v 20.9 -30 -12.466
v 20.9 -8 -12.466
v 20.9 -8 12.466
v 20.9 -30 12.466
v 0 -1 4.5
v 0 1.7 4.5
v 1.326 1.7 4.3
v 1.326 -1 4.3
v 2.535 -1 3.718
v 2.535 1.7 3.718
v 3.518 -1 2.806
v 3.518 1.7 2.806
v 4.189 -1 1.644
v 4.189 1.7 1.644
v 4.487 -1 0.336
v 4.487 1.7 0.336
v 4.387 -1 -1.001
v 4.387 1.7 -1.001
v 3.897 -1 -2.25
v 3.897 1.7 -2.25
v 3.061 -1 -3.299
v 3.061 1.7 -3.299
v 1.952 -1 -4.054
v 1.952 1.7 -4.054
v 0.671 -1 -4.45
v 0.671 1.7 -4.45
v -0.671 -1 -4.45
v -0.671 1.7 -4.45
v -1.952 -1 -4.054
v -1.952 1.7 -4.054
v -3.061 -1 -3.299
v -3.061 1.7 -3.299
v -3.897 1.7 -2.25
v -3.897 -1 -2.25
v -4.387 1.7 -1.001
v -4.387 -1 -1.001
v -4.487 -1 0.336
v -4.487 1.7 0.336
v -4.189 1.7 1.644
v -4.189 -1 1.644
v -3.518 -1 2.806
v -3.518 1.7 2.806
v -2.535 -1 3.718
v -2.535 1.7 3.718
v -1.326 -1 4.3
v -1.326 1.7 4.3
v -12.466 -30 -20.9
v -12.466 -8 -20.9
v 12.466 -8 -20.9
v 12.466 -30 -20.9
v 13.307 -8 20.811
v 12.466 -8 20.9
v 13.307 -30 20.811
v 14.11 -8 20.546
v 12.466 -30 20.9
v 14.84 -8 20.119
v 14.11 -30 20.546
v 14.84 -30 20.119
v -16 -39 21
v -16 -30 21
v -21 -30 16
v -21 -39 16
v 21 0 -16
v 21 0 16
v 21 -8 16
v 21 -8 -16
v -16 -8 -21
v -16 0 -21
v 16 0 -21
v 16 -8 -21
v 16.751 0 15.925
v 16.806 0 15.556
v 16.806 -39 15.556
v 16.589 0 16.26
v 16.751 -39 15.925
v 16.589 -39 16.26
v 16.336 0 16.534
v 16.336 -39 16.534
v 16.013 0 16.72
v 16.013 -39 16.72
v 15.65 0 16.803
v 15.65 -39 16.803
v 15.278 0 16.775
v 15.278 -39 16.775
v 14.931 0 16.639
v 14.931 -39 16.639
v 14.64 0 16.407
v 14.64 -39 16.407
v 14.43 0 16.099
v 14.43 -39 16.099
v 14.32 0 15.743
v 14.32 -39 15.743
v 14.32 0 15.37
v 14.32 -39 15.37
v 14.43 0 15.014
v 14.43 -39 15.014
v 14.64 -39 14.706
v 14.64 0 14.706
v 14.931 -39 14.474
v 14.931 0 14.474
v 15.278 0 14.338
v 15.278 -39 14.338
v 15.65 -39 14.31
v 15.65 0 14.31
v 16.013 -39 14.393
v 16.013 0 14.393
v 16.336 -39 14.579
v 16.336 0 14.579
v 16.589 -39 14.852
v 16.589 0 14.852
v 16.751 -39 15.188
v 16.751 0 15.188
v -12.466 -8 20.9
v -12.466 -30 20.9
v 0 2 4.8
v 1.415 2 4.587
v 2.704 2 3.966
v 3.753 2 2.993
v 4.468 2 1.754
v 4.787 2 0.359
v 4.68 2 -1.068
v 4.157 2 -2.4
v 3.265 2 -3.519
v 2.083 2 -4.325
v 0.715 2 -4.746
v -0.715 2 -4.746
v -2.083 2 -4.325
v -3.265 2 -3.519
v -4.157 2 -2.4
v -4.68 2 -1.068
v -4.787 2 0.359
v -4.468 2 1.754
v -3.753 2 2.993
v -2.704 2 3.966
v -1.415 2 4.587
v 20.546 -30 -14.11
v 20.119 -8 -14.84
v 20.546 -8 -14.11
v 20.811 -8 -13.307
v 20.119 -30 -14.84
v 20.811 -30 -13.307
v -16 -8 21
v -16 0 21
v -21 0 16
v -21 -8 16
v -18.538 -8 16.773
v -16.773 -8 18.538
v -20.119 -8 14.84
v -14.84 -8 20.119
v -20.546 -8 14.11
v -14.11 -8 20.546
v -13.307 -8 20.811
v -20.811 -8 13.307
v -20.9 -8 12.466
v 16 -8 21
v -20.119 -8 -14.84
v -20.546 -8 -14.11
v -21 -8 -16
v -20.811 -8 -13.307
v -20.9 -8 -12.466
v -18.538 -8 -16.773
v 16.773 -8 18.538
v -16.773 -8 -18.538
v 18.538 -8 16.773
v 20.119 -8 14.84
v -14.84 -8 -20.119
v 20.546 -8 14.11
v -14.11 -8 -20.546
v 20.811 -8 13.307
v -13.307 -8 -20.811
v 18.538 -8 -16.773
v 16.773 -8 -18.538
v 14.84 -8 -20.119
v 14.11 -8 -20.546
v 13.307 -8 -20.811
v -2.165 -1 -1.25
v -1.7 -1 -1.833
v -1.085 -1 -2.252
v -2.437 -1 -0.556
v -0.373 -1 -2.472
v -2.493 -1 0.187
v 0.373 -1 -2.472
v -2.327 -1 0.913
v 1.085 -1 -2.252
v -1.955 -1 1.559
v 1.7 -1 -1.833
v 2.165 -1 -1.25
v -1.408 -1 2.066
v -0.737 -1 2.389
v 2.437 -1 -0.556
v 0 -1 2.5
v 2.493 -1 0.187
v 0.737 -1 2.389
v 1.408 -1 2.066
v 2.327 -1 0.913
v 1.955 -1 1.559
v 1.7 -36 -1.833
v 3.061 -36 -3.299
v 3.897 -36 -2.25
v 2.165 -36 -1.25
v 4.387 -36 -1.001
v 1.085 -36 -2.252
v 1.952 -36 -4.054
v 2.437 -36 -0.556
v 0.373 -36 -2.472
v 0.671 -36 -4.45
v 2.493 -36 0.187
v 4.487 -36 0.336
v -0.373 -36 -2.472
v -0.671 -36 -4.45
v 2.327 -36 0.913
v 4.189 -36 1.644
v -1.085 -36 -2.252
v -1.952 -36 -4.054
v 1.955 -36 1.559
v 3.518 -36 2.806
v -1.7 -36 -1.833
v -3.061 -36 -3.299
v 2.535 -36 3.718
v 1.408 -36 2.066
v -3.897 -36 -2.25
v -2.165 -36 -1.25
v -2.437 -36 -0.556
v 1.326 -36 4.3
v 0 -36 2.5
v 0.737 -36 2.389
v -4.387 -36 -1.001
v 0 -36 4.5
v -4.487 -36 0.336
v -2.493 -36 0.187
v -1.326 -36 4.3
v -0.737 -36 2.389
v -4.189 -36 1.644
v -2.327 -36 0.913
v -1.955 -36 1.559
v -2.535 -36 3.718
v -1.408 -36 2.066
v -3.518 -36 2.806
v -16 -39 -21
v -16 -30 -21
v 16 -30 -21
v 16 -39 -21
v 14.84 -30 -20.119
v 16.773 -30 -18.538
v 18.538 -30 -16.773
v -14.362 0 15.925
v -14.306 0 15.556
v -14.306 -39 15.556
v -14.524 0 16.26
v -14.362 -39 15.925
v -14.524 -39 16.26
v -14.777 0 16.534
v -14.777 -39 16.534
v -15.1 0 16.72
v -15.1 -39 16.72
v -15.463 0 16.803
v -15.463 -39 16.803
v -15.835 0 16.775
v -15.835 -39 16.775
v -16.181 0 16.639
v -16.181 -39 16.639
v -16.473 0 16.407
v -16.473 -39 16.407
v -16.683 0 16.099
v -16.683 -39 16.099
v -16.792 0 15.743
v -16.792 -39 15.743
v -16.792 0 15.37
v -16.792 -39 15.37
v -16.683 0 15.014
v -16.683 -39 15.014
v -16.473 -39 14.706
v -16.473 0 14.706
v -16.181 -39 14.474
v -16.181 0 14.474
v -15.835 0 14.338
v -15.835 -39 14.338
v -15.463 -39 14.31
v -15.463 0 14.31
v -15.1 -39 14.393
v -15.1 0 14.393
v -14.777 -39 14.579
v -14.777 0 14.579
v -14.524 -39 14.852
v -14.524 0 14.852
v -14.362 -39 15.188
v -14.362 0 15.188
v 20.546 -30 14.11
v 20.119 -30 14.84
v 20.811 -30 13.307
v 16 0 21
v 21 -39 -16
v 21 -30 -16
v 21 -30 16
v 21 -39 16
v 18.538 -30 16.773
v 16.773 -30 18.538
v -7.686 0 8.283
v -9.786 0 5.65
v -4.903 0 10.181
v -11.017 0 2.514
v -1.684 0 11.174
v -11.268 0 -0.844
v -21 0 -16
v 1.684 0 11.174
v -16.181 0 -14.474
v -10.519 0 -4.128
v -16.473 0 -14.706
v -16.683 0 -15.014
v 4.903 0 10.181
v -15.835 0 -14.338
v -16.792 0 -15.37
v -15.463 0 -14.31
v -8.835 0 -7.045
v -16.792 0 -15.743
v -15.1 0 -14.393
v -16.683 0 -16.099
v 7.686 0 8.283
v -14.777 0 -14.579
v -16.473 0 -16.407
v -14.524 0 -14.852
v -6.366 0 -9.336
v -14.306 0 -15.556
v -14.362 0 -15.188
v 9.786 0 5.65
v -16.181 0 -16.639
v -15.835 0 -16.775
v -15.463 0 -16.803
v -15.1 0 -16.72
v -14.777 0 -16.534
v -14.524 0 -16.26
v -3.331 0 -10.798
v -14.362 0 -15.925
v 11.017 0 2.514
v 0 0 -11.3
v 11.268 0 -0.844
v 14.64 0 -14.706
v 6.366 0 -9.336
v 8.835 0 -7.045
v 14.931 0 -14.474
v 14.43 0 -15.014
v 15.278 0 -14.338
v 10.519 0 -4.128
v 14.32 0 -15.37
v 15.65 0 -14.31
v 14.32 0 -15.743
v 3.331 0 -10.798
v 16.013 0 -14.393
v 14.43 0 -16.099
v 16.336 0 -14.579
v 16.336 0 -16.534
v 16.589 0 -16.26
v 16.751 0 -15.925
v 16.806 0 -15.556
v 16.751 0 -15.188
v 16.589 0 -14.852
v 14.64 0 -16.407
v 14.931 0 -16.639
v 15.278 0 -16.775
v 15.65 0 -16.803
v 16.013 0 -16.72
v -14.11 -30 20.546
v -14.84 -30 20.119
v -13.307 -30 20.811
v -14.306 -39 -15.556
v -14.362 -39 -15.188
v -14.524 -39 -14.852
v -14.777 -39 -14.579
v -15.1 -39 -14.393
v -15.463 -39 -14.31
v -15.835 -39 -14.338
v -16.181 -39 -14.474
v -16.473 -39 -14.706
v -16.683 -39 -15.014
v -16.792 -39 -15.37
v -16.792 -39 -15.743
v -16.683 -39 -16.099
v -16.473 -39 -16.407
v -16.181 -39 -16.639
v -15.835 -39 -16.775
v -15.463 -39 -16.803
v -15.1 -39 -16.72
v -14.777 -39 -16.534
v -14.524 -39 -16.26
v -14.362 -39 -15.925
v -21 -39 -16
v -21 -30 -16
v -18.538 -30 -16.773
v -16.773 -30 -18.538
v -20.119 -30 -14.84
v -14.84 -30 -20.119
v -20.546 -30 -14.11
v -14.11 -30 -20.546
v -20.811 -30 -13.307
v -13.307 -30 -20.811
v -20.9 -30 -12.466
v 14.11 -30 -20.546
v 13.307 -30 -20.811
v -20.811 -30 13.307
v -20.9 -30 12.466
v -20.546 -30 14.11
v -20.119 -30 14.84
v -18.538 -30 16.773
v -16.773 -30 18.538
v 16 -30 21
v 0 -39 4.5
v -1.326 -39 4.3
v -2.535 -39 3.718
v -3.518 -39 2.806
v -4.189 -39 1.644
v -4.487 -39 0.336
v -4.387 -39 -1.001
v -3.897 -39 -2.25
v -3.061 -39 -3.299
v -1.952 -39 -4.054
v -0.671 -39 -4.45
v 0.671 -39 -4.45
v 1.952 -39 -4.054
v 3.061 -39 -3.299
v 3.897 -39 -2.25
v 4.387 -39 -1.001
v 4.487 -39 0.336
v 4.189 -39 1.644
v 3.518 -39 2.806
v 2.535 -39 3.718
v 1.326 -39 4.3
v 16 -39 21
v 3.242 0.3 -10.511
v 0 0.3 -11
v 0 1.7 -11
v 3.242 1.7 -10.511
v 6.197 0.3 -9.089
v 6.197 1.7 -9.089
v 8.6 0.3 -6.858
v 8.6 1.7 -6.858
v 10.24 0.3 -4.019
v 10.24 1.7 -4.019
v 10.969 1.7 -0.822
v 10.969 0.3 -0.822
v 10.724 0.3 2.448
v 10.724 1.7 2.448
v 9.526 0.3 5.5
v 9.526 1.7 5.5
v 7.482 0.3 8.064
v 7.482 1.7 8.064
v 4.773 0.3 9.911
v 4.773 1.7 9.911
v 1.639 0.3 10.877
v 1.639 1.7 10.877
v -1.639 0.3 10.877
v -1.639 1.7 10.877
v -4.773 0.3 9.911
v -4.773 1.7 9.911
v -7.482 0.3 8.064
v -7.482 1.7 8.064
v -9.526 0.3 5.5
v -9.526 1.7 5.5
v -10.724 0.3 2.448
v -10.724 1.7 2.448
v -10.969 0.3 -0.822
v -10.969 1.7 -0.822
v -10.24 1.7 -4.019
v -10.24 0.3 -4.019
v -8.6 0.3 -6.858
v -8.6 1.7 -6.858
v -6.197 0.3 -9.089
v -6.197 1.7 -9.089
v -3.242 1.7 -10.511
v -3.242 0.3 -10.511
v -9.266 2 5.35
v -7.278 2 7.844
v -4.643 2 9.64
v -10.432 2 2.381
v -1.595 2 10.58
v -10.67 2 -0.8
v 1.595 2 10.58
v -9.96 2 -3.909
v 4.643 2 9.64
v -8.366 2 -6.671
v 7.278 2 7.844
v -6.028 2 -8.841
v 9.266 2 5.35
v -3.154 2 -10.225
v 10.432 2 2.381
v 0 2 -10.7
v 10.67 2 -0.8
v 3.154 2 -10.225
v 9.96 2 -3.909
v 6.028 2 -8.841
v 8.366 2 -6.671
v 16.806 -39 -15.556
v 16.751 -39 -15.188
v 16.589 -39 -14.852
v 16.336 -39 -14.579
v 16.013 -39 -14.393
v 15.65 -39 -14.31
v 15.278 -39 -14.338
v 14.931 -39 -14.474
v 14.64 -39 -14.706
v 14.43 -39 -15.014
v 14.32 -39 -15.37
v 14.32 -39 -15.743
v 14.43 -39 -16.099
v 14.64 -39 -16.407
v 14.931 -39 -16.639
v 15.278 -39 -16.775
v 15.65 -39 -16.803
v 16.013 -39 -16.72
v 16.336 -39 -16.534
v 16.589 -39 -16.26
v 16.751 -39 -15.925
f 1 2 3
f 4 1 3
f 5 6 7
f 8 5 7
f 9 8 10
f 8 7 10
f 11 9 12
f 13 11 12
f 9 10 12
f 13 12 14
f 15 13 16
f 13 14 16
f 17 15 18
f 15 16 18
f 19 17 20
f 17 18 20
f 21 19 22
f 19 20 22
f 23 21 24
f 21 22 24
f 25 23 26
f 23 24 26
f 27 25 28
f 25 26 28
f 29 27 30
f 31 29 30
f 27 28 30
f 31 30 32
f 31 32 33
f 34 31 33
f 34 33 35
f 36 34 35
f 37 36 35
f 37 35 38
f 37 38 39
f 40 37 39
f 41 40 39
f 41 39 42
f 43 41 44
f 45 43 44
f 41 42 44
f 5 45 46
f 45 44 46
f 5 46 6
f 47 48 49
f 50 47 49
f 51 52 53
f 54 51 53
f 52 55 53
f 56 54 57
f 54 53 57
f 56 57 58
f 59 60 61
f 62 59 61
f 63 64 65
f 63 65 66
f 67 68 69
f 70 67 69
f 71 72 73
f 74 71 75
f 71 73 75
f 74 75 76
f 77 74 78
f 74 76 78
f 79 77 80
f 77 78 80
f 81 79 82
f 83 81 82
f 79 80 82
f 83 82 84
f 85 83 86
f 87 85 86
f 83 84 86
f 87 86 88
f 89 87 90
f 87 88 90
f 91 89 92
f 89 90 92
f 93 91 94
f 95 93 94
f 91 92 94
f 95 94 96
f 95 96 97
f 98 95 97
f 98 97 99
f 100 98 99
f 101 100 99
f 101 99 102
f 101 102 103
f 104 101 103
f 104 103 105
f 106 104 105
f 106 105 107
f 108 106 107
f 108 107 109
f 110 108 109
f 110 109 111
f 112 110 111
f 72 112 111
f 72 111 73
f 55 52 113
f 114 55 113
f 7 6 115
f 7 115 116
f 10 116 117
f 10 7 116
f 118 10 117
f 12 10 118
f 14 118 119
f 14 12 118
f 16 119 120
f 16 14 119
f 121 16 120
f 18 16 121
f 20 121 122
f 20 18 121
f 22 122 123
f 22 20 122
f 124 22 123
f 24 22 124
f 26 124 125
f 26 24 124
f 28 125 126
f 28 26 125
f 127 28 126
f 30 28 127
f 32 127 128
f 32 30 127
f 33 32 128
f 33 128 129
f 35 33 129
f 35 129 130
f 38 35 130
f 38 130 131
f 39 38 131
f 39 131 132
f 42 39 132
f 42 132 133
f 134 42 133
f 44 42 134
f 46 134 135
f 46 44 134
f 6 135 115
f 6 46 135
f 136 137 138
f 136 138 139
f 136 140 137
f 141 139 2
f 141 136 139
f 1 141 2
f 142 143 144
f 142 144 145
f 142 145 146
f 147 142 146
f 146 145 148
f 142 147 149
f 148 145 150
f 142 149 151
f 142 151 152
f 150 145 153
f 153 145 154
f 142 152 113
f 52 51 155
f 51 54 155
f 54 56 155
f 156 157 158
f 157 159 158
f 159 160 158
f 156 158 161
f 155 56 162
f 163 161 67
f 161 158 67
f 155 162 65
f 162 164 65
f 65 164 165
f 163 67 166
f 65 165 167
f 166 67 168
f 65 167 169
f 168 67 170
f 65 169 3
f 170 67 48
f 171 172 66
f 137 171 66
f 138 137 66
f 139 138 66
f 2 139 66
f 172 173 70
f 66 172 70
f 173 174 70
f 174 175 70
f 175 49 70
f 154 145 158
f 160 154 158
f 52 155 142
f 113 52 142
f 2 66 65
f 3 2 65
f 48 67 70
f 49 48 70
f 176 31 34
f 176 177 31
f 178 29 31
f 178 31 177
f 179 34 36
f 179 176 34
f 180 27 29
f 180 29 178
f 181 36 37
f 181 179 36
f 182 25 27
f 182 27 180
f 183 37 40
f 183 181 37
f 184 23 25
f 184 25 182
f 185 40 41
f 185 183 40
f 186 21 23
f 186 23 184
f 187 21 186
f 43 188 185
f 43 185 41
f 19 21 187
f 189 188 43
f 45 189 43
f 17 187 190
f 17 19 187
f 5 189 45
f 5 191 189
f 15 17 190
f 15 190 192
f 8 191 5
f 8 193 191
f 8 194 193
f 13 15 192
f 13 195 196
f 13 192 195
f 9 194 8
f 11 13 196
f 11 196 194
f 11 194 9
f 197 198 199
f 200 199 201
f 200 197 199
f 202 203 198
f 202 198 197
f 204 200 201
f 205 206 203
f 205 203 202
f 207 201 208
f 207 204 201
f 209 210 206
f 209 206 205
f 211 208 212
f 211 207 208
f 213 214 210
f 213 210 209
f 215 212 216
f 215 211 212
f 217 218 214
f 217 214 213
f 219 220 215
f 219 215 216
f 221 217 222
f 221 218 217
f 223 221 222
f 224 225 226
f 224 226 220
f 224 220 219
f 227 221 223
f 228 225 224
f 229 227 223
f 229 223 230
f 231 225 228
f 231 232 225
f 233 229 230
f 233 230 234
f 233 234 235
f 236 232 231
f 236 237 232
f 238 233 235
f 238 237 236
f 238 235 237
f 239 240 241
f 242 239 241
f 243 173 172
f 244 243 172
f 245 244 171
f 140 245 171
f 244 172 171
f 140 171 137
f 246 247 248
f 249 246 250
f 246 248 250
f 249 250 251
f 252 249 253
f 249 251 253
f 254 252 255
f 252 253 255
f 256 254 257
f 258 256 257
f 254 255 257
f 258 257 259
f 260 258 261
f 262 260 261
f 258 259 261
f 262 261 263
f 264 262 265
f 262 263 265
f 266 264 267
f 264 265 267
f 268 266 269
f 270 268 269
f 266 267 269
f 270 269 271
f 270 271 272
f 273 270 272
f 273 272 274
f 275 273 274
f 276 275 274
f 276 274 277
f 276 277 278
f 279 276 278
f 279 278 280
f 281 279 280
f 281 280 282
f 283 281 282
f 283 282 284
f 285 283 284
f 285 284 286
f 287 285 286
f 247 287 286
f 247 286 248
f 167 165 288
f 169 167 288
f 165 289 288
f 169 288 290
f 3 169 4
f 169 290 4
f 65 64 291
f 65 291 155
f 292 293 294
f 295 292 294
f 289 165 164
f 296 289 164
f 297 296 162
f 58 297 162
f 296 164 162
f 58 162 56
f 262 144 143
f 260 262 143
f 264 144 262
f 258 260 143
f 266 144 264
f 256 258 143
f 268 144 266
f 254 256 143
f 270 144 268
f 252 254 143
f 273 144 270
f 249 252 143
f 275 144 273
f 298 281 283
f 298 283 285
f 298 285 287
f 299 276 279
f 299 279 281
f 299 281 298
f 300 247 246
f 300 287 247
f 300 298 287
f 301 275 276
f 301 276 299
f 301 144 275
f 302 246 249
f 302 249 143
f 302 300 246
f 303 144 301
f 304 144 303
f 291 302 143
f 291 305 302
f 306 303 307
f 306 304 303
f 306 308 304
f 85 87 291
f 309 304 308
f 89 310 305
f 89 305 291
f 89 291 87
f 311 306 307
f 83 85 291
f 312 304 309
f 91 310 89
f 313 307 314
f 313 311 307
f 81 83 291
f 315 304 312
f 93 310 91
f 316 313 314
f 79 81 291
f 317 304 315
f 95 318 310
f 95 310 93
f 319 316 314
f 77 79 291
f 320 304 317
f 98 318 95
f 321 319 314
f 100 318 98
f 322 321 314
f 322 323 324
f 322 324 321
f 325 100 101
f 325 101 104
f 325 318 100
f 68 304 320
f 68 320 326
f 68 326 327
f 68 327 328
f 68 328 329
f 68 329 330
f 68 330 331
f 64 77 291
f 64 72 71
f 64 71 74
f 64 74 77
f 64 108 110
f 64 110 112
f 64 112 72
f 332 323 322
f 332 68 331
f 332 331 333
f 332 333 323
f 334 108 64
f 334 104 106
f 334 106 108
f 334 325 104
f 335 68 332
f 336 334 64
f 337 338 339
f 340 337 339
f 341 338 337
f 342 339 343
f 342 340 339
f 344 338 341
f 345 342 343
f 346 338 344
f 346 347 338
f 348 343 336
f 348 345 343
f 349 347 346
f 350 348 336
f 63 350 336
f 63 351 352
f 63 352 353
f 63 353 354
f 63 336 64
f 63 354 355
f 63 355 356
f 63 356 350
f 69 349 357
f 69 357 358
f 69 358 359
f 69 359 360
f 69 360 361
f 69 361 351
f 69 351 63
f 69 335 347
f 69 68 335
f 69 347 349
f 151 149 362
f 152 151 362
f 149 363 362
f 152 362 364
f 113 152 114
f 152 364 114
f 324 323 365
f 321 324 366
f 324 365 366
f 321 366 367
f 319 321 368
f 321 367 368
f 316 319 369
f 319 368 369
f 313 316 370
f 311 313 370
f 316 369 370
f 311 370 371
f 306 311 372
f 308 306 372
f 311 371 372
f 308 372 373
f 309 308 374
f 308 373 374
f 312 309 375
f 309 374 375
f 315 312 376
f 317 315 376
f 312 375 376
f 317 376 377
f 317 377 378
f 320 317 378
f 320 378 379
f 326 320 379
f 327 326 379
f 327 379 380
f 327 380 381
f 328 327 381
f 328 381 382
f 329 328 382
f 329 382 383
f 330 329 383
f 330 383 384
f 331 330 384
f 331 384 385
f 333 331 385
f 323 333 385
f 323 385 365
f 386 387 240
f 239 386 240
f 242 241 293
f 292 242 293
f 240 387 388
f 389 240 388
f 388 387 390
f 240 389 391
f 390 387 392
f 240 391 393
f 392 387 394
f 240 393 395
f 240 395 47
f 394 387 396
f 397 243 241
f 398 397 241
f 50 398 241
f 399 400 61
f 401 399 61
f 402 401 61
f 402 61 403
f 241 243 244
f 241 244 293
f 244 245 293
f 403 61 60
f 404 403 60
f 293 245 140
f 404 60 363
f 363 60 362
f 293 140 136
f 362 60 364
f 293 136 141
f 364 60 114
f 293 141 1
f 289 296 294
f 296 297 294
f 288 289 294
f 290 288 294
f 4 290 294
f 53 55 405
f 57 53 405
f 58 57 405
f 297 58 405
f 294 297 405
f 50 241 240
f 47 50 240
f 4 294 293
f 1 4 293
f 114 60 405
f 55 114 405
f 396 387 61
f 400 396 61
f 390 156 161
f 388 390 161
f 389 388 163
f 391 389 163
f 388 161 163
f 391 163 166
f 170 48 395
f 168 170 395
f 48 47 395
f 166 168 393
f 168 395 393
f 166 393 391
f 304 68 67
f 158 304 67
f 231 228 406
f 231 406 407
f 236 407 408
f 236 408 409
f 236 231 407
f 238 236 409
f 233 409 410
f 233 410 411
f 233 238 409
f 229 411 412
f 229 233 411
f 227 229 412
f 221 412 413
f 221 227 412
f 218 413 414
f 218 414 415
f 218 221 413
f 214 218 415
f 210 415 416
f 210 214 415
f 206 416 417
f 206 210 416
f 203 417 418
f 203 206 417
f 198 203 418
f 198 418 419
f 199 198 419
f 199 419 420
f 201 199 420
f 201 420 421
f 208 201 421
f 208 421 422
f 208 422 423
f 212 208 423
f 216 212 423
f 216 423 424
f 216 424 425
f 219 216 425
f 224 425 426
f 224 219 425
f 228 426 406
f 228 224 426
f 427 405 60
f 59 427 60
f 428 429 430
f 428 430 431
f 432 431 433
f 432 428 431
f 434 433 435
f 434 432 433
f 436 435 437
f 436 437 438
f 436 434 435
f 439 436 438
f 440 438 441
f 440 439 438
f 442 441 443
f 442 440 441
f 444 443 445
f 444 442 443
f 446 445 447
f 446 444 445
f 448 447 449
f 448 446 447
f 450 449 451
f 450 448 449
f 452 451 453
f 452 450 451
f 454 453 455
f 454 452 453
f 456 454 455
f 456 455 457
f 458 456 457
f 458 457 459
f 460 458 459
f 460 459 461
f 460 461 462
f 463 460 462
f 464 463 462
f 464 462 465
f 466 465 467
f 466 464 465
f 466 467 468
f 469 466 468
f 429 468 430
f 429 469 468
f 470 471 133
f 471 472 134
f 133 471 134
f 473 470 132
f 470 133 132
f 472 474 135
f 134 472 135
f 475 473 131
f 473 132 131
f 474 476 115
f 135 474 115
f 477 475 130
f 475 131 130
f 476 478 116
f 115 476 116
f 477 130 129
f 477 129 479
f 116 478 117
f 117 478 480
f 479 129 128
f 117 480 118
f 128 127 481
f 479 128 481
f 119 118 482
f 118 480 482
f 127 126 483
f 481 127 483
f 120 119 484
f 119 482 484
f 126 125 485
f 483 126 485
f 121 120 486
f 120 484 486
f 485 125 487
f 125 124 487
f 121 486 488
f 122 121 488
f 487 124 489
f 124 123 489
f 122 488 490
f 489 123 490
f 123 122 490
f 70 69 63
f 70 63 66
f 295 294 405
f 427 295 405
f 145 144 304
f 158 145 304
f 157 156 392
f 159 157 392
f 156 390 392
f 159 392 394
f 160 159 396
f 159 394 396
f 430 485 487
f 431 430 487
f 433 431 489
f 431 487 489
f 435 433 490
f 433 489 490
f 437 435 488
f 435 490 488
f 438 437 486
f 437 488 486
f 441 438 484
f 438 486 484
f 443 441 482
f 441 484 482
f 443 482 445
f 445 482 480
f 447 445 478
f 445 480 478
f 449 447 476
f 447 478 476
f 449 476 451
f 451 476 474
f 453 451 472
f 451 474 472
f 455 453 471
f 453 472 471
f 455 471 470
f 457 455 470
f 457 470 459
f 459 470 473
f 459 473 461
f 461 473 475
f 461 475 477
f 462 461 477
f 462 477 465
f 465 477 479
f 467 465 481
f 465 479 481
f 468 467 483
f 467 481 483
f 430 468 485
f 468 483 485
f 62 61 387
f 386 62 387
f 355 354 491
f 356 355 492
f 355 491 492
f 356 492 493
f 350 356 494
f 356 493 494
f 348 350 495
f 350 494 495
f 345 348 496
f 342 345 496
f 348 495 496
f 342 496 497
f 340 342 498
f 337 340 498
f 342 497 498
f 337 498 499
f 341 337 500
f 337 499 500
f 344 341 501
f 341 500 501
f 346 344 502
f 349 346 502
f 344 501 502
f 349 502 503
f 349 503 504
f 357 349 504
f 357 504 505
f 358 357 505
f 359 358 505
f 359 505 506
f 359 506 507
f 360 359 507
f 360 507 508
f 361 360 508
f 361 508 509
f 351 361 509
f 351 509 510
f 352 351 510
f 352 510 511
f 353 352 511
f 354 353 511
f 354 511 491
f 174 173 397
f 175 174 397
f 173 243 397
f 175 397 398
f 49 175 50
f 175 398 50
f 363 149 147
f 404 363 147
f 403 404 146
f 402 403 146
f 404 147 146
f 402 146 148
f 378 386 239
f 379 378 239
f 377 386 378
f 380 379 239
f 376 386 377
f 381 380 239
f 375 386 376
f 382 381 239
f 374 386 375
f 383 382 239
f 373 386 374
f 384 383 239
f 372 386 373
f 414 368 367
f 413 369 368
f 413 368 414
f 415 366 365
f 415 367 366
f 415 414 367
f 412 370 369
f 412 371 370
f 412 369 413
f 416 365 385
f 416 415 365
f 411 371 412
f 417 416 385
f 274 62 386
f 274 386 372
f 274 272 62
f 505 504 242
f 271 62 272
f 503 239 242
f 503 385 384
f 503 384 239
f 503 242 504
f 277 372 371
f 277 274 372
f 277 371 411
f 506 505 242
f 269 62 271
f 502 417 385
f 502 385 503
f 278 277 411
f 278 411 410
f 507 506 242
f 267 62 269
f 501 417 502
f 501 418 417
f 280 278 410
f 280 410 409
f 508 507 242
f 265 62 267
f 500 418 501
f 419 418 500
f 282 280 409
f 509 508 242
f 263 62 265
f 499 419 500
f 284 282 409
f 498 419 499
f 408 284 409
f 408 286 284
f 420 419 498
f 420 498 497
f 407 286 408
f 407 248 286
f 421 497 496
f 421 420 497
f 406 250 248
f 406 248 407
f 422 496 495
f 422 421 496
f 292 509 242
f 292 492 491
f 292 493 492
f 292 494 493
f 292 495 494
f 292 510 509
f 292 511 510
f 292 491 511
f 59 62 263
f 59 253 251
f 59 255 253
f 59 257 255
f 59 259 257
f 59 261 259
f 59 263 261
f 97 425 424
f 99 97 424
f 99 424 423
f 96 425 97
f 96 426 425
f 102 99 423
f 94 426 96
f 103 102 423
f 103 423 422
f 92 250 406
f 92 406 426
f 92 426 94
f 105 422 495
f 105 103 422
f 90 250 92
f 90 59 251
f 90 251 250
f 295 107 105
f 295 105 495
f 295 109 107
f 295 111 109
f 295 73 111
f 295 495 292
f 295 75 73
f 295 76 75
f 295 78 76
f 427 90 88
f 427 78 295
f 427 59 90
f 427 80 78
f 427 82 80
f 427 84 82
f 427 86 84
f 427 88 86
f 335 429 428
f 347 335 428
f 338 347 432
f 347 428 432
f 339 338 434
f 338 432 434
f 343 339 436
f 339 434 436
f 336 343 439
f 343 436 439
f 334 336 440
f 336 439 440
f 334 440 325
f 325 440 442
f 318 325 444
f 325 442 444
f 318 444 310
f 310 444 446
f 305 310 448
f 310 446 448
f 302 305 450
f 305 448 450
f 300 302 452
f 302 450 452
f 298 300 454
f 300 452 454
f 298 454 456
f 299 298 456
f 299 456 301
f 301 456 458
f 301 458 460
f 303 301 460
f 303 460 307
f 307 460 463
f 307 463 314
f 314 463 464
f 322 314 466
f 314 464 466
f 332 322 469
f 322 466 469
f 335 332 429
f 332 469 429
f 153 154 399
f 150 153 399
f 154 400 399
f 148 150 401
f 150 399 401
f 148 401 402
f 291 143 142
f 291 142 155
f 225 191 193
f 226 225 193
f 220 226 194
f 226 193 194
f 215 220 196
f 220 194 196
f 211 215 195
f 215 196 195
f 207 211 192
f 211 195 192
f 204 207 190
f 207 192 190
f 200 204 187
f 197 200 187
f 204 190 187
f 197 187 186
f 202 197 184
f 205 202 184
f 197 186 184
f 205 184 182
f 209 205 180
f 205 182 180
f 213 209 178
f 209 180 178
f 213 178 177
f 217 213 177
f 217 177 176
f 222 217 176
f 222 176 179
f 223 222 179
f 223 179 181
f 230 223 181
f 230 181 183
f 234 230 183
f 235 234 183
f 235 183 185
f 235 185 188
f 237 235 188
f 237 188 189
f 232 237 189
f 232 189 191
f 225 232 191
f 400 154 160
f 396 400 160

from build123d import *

# Parameters (mm, degrees)
ESQUISSE1_W             = 42
ESQUISSE1_H             = 42
BOSS_EXTRU_1_DEPTH      = 8
CHANFREIN1_SIZE         = 5
ESQUISSE2_R             = 11
BOSS_EXTRU_2_DEPTH      = 2
ESQUISSE5_R             = 4.5
ENL_V_MAT_EXTRU_1_DEPTH = 3
CHANFREIN2_SIZE         = 0.3
BOSS_EXTRU_3_DEPTH      = 22
CONG_1_R                = 4
BOSS_EXTRU_4_DEPTH      = 9
ENL_V_START             = -3
ESQUISSE8_R             = 4.5
ENL_V_MAT_EXTRU_2_DEPTH = 3
TROU_TARAUD_M31_D       = 2.5
ESQUISSE9_R             = 2.5
ENL_V_MAT_EXTRU_3_DEPTH = 49.228622207


with BuildPart() as part:
    # Esquisse1 → Boss.-Extru.1 (new body)
    with BuildSketch(Plane(origin=(0, 0, 0), x_dir=(1, 0, 0), z_dir=(0, 1, 0))):
        Rectangle(ESQUISSE1_W, ESQUISSE1_H)
    extrude(amount=-BOSS_EXTRU_1_DEPTH)

    # Chanfrein1
    chanfrein1_edges = [part.edges().sort_by_distance(p)[0] for p in [
        (-21, -4, -21),
        (21, -4, -21),
        (21, -4, 21),
        (-21, -4, 21),
    ]]
    chamfer(chanfrein1_edges, length=CHANFREIN1_SIZE)

    # Esquisse2 → Boss.-Extru.2 (add)
    with BuildSketch(Plane(origin=(0, 0, 0), x_dir=(-1, 0, 0), z_dir=(0, -1, 0))):
        with Locations(Location((0, 0, 0), (0, 0, 90))):
            Circle(ESQUISSE2_R)
    extrude(amount=-BOSS_EXTRU_2_DEPTH)

    # Esquisse5 → Enlèv. mat.-Extru.1 (cut)
    with BuildSketch(Plane(origin=(0, 2, 0), x_dir=(1, 0, 0), z_dir=(0, 1, 0))):
        with Locations(Location((0, 0, 0), (0, 0, 270))):
            Circle(ESQUISSE5_R)
    extrude(amount=-ENL_V_MAT_EXTRU_1_DEPTH, mode=Mode.SUBTRACT)

    # Chanfrein2
    chanfrein2_edges = [part.edges().sort_by_distance(p)[0] for p in [
        (0, 0, 11),
        (0, 2, 11),
        (0, 2, -4.5),
    ]]
    chamfer(chanfrein2_edges, length=CHANFREIN2_SIZE)

    # Esquisse6 → Boss.-Extru.3 (add)
    with BuildSketch(Plane.XZ.offset(8)):
        with BuildLine():
            Line((20.9, -13.718236038), (20.9, 13.718236038))
            ThreePointArc((20.9, 13.718236038), (17.67766953, 17.67766953), (13.718236038, 20.9))
            Line((13.718236038, 20.9), (-13.718236038, 20.9))
            ThreePointArc((-13.718236038, 20.9), (-17.67766953, 17.67766953), (-20.9, 13.718236038))
            Line((-20.9, 13.718236038), (-20.9, -13.718236038))
            ThreePointArc((-20.9, -13.718236038), (-17.67766953, -17.67766953), (-13.718236038, -20.9))
            Line((-13.718236038, -20.9), (13.718236038, -20.9))
            ThreePointArc((13.718236038, -20.9), (17.67766953, -17.67766953), (20.9, -13.718236038))
        make_face()
    extrude(amount=BOSS_EXTRU_3_DEPTH)

    # Congé1
    cong_1_edges = [part.edges().sort_by_distance(p)[0] for p in [
        (13.718236038, -19, -20.9),
        (20.9, -19, -13.718236038),
        (20.9, -19, 13.718236038),
        (13.718236038, -19, 20.9),
        (-13.718236038, -19, 20.9),
        (-20.9, -19, 13.718236038),
        (-20.9, -19, -13.718236038),
        (-13.718236038, -19, -20.9),
    ]]
    fillet(cong_1_edges, radius=CONG_1_R)

    # Esquisse7 → Boss.-Extru.4 (add)
    with BuildSketch(Plane.XZ.offset(30)):
        Polygon((-16, -21), (16, -21), (21, -16), (21, 16), (16, 21), (-16, 21), (-21, 16), (-21, -16), align=None)
    extrude(amount=BOSS_EXTRU_4_DEPTH)

    # Esquisse8 → Enlèv. mat.-Extru.2 (cut)
    with BuildSketch(Plane.XZ.offset(39).offset(ENL_V_START)):
        with Locations(Location((0, 0, 0), (0, 0, 90))):
            Circle(ESQUISSE8_R)
    extrude(amount=ENL_V_MAT_EXTRU_2_DEPTH, mode=Mode.SUBTRACT)

    # Trou taraudé M31 (through all)
    with Locations(Plane(origin=(-18.160222152, 0, -3.642693465), x_dir=(-1, 0, 0), z_dir=(0, 1, 0))):
        with Locations((-33.716571339, 19.199042651), (-33.716571339, -11.913655721), (-2.603872966, -11.913655721), (-2.603872966, 19.199042651)):
            Hole(TROU_TARAUD_M31_D / 2)

    # Esquisse9 → Enlèv. mat.-Extru.3 (cut, through all)
    with BuildSketch(Plane(origin=(0, -1, 0), x_dir=(1, 0, 0), z_dir=(0, 1, 0))):
        with Locations(Location((0, 0, 0), (0, 0, 270))):
            Circle(ESQUISSE9_R)
    extrude(amount=-ENL_V_MAT_EXTRU_3_DEPTH, mode=Mode.SUBTRACT)


solid = part.part
